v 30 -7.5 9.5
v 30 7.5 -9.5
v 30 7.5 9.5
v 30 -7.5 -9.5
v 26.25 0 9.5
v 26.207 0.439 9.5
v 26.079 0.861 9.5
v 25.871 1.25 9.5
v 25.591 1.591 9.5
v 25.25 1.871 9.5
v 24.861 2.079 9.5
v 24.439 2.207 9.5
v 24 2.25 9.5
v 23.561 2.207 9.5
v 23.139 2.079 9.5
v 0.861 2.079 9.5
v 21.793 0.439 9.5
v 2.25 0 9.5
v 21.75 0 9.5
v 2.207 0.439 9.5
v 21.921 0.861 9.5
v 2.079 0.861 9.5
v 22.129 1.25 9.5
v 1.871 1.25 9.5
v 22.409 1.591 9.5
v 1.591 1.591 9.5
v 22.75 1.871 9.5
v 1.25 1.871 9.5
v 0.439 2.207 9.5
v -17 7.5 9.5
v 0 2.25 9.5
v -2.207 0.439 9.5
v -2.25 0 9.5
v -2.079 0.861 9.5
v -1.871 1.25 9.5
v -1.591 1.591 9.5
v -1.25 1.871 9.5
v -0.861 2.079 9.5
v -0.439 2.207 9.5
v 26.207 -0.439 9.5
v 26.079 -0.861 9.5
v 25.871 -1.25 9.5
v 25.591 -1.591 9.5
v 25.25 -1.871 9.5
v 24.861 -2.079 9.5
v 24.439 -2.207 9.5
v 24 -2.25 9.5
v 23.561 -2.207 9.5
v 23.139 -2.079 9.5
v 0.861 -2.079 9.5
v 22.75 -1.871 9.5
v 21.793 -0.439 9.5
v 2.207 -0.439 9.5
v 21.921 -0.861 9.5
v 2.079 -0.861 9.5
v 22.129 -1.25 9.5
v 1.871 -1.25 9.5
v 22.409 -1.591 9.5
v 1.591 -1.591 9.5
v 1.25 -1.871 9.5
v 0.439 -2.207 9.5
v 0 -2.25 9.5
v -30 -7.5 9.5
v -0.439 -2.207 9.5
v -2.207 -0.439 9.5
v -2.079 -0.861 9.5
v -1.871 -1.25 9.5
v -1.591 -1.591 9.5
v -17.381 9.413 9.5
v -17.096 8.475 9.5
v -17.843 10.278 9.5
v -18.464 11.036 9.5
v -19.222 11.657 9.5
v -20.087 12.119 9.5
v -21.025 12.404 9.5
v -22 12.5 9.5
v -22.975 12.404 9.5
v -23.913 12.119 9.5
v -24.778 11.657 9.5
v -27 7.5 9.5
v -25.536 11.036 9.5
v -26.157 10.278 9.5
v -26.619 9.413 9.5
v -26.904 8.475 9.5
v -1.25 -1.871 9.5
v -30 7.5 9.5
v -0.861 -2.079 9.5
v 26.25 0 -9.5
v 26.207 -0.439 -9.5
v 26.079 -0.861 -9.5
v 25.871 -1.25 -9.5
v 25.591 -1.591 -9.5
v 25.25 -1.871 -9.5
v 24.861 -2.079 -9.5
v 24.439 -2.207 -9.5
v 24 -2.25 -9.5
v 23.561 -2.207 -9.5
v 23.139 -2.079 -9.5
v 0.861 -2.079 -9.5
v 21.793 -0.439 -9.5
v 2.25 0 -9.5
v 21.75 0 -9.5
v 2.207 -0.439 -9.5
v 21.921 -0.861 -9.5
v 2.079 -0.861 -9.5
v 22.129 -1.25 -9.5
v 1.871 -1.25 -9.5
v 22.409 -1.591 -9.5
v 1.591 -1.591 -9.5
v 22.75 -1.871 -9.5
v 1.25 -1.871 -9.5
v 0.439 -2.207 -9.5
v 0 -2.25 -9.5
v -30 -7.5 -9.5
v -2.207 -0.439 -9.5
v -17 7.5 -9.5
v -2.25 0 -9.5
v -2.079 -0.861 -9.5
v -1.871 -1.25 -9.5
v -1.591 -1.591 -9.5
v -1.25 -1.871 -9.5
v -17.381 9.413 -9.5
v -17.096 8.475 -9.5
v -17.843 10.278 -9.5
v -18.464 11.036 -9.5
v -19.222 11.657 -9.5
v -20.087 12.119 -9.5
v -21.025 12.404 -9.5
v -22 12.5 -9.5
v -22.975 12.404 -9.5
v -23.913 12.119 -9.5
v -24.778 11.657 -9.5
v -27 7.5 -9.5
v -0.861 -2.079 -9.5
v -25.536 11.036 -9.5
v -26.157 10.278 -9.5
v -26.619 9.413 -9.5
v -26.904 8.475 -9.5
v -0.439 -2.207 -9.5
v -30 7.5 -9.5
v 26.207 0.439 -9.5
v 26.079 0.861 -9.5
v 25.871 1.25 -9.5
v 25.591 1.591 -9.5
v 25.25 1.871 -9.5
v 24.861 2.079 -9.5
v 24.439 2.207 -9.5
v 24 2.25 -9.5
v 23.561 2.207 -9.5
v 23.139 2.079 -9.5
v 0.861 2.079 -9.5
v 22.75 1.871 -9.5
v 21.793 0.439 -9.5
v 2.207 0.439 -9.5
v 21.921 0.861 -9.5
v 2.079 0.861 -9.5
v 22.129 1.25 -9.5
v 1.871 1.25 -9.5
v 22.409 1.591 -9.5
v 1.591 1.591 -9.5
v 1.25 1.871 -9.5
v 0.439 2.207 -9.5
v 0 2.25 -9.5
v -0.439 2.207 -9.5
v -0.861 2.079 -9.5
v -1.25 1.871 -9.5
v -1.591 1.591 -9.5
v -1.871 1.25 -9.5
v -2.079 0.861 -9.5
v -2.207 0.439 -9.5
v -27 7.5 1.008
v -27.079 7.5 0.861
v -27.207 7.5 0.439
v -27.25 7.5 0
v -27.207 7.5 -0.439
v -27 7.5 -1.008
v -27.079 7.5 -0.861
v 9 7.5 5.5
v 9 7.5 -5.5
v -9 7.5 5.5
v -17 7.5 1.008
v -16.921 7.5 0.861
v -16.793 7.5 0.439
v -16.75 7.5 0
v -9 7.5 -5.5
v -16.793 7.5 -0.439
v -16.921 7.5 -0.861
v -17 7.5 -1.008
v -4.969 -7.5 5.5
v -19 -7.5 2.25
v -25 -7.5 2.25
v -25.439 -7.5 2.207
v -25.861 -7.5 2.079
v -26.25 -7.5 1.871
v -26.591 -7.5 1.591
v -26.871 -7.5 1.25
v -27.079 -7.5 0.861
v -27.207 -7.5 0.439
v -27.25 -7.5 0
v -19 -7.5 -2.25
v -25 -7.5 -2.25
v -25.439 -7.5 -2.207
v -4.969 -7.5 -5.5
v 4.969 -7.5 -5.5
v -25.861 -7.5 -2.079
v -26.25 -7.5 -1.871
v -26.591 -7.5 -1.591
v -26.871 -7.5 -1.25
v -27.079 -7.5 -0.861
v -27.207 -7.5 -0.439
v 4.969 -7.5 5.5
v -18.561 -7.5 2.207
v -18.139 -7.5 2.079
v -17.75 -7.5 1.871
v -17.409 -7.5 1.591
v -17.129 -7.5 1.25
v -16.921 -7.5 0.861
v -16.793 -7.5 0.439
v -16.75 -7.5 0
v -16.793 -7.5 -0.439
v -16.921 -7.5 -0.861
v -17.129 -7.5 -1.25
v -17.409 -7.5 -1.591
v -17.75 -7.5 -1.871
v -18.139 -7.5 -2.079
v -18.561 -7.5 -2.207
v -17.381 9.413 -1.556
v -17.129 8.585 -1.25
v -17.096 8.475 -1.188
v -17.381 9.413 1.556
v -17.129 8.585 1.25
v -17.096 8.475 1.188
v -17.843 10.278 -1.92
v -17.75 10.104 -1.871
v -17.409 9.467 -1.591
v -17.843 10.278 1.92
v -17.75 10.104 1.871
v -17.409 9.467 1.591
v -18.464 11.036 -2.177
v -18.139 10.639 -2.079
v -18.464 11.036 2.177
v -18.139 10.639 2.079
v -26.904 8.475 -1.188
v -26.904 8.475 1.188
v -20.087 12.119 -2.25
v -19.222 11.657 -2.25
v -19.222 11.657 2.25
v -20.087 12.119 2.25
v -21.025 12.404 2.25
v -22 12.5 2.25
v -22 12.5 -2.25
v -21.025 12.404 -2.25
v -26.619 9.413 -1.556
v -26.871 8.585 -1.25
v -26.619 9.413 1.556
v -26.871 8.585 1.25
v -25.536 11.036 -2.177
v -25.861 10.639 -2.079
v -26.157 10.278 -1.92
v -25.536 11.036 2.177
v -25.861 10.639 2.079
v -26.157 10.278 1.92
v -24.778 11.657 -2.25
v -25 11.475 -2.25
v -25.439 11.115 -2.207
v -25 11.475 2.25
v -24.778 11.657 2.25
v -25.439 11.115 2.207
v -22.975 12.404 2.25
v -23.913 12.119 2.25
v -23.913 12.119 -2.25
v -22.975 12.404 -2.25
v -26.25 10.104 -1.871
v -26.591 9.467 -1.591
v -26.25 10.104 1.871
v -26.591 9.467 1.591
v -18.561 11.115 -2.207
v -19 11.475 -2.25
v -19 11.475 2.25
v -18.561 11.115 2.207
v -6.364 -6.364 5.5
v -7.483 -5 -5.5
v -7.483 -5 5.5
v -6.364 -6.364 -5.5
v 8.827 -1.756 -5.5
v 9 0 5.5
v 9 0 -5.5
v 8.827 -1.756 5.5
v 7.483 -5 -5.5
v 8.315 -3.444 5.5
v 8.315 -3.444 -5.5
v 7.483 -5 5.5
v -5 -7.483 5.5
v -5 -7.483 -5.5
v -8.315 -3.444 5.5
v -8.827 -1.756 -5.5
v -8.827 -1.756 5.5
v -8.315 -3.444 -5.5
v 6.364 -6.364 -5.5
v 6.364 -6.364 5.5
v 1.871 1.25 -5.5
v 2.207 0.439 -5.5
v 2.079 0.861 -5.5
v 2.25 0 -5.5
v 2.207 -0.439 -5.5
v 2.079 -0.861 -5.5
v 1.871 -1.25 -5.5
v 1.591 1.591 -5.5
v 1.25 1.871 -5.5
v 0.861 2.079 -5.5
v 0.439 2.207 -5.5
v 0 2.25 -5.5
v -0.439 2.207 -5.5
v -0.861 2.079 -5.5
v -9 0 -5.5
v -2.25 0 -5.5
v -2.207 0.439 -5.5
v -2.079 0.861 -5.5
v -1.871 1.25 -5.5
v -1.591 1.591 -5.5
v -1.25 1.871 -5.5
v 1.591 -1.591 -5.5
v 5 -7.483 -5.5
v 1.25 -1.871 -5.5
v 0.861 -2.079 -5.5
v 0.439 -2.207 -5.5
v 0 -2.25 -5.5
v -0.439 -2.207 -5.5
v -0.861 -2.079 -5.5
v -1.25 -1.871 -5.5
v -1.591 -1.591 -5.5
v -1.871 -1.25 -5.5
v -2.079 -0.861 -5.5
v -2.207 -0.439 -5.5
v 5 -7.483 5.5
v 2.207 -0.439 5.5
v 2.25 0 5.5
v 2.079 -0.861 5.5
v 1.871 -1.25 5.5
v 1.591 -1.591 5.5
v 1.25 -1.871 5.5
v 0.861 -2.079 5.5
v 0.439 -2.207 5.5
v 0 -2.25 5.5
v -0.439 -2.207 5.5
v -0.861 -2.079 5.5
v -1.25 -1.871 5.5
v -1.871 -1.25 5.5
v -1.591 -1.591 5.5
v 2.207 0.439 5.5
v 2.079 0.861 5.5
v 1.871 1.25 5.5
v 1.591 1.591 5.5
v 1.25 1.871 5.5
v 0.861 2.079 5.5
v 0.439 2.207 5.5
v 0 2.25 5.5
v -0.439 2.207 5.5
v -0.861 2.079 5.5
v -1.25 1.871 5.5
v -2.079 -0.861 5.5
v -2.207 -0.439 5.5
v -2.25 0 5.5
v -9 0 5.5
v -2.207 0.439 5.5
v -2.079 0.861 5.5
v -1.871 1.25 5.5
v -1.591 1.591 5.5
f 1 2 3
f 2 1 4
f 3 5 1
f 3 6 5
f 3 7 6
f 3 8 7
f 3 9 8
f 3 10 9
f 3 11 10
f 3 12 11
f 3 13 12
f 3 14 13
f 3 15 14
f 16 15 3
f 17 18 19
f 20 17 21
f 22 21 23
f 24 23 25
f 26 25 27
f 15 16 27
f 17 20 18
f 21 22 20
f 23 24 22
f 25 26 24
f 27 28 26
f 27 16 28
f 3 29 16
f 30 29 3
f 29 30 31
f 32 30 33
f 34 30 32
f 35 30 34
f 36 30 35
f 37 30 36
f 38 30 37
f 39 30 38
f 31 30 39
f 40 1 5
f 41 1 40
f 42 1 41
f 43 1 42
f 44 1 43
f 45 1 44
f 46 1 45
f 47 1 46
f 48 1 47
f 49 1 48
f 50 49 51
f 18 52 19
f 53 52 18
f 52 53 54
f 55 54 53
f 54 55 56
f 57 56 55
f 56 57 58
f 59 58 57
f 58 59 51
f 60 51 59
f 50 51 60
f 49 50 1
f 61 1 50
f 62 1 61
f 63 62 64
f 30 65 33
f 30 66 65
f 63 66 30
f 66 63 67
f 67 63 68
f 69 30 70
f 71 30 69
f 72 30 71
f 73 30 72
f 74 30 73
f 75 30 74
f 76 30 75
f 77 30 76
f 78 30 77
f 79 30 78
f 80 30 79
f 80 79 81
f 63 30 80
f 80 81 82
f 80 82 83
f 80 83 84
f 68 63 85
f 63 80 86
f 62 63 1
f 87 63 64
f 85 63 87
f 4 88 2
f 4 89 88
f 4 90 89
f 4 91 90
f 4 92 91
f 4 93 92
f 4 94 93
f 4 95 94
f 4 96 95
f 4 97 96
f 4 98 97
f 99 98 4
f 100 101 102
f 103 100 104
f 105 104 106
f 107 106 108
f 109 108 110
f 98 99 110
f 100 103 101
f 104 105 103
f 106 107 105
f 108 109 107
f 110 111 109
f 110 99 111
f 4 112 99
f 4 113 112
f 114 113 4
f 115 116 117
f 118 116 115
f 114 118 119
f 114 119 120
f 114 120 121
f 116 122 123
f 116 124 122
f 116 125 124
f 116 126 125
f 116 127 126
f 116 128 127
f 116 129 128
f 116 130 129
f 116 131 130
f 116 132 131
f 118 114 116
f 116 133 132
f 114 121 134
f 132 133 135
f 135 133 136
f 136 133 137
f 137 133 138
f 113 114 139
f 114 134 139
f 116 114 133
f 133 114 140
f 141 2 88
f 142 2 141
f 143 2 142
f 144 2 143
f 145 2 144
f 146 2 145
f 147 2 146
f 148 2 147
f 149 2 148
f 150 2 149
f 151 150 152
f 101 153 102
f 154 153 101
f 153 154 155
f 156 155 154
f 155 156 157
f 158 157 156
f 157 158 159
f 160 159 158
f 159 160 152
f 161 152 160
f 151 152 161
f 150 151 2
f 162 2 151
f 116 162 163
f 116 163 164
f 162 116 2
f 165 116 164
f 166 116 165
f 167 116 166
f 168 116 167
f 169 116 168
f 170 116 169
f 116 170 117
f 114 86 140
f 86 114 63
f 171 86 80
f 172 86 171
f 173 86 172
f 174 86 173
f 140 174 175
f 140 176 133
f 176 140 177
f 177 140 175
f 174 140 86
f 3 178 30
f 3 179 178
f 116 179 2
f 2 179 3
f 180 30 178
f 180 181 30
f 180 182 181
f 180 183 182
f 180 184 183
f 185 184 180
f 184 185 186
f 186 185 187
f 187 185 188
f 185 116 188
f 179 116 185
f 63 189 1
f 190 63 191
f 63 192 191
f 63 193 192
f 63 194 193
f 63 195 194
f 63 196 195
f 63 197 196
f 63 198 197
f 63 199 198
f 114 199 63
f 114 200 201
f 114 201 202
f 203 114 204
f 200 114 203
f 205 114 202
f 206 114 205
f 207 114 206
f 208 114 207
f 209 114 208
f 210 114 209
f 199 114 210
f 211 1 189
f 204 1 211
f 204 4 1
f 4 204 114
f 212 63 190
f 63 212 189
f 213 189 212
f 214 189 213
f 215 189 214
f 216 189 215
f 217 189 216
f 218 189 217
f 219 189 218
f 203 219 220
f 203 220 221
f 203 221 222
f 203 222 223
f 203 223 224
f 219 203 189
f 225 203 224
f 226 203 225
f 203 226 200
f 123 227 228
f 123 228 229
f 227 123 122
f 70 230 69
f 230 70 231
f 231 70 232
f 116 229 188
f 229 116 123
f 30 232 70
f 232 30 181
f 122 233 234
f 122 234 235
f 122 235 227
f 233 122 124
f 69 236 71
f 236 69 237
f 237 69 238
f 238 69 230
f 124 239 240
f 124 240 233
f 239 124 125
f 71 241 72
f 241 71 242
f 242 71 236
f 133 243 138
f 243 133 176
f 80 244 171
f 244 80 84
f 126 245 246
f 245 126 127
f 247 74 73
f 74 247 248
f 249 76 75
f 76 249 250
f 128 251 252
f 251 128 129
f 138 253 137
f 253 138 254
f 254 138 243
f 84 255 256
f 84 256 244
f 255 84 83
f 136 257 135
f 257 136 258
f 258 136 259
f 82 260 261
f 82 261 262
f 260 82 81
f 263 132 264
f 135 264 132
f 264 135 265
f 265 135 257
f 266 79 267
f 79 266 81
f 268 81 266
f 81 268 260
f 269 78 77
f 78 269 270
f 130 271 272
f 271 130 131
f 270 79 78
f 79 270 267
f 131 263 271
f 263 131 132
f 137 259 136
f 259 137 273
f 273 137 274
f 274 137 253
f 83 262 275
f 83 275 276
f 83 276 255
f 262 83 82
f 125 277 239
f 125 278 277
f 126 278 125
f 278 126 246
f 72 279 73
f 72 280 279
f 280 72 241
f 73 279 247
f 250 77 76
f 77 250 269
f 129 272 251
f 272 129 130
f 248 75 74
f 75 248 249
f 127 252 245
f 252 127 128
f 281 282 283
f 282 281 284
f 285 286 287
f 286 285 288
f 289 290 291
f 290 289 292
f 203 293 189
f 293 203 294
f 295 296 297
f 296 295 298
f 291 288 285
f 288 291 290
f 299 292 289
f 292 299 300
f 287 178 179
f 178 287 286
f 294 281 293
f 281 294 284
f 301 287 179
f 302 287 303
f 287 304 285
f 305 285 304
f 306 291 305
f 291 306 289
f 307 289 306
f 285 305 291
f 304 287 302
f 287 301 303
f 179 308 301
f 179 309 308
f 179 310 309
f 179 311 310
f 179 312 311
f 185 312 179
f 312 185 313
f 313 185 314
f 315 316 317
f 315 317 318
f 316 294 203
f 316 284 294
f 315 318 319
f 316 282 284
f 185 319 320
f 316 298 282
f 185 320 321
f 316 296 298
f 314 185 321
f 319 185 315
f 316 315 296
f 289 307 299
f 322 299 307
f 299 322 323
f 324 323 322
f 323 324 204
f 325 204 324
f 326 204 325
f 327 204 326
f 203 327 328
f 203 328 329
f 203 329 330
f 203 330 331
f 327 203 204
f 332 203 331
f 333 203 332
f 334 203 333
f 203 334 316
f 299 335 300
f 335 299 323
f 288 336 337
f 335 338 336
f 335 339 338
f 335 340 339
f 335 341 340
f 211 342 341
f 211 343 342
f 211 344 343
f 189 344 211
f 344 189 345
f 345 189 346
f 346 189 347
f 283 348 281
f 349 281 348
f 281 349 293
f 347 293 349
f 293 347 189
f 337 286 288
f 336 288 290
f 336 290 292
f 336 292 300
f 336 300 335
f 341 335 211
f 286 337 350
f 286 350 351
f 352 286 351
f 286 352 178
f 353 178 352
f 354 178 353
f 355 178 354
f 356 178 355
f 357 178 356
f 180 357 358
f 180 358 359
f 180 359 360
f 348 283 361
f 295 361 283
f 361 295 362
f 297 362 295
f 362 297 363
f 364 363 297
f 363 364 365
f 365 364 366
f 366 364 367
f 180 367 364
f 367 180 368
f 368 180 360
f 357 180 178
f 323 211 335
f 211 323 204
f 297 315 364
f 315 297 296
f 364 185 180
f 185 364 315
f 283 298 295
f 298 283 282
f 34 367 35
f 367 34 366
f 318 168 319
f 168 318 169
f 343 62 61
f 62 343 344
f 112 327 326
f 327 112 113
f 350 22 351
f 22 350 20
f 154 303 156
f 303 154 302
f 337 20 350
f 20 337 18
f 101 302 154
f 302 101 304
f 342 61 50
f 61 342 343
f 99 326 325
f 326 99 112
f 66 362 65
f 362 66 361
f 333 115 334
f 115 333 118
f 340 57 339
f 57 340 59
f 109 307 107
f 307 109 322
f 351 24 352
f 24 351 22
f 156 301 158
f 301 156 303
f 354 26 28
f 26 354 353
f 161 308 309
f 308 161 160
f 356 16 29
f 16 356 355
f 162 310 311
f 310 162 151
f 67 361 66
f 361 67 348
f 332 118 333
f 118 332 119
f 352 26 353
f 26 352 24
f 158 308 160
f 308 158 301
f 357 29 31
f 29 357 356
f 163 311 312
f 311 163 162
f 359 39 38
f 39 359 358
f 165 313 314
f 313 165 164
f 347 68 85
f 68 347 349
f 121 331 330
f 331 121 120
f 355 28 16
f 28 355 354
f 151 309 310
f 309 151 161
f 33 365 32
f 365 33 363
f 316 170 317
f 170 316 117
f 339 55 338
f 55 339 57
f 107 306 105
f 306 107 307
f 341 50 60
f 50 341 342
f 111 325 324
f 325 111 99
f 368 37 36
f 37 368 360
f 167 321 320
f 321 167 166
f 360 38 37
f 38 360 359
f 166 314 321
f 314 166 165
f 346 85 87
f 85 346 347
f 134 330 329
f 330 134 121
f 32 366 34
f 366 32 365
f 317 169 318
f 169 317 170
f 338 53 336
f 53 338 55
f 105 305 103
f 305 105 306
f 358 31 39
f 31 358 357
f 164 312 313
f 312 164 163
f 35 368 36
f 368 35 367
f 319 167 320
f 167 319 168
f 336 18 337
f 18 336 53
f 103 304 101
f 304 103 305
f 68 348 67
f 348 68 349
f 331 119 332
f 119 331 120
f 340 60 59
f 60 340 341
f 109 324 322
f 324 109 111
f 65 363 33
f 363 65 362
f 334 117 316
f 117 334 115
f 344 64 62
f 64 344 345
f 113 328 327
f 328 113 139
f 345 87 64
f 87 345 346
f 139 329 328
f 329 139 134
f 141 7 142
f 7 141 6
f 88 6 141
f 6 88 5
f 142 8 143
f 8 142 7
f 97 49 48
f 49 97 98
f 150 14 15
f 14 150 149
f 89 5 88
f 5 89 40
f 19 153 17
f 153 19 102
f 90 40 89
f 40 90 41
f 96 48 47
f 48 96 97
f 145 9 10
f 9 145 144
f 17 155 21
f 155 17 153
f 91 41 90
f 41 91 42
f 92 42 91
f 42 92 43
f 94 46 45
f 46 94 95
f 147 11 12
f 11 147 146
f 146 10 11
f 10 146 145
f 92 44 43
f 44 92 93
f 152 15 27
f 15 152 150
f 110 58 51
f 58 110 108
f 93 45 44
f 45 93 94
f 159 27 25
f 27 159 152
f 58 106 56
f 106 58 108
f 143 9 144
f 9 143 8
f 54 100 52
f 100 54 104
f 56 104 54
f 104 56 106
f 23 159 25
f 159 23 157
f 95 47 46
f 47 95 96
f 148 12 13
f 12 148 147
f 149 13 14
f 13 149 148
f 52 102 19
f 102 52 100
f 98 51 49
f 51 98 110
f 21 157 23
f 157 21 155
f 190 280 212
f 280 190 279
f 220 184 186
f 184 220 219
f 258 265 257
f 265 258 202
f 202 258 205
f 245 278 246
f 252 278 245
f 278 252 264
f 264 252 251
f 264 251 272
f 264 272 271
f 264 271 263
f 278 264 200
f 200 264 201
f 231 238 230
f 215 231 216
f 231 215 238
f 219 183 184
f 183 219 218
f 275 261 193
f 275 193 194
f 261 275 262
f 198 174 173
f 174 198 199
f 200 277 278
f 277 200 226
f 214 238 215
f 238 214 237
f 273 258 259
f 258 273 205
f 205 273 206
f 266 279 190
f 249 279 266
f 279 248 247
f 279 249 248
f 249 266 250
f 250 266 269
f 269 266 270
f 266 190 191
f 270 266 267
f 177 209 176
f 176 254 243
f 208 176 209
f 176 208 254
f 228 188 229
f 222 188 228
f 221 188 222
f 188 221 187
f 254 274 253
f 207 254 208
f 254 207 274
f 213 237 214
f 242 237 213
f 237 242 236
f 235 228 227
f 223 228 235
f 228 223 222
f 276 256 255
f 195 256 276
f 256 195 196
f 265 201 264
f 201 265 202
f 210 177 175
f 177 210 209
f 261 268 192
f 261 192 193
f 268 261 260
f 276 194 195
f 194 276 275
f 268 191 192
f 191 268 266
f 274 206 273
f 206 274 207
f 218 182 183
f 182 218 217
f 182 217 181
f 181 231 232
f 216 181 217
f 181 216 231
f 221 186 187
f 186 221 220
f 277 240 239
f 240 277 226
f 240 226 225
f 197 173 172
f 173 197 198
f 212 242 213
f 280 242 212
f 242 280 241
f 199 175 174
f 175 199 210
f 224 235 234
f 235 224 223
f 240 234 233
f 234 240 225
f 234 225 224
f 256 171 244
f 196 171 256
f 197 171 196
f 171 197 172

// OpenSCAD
// file: modules.scad
// Fonctions personnalisées

//http://forum.openscad.org/Wish-mirror-copy-true-td10681.html
module copy_mirror(vec=[0,1,0])
{
    children();
    mirror(vec) children();
}

module ecrou(plat,h){
  cylinder(d=plat*2/sqrt(3), h=h, $fn=6);
}


module courroie(diam,longueur){
  color ("black")
  difference(){
    hull(){
      cylinder(d=diam+1, h=6, $fn=32);
      translate([longueur,0,0]) cylinder(d=diam+1, h=6, $fn=32);
    }
    translate([0,0,-1])
    hull(){
      cylinder(d=diam-1, h=8, $fn=32);
      translate([longueur,0,0]) cylinder(d=diam-1, h=8, $fn=32);
    }
  }
  
  
}
// file: config.scad
// Paramètres de la machine

decal=-30;            // décallage du chassis xz
hauteur=400;          // hauteur totale chassis
largeur=400;          // largeur totale chassis
longueur=470;         // longueur totale chassis
hauteur_base=90;      // hauteur de la base
entraxe_y=140;        // distance entre les tiges Ø8 axe Y
entraxe_x=45;         // distance entre les tiges Ø8 axe X

couleur=[1,0.6,0];



// Paramètre des pièces et jeux

// écart plateau/courroie
// y_belt_holder
belt_h=13;      // écart entre la courroie et le plateau

// écart plateau/tiges lisses
// y_lm8uu
decal_plateau=12; // Décallage en Y

// décallage des tiges lisses Y
// support_tige8_y
decal_tiges=5;

// décallage moteur Y
// y_motor
decal_motory_z=11;
decal_motory_y=25;

// Equerres de fixation position fermée
eq_ec=10;      // écart entre profilés

// Fixations axe Z
pos_z=26;      // position des axes par rapport au profilé (>= 21)
hauteur_z=20;  // hauteur des fixations
entraxe_z=17;  // distance entre les tiges Ø8 et M5
// est ce que la tige de 8 dépasse du profilé de 30?
// si oui, on décale les fixations
decalx=max(-42/2+entraxe_z+8/2+2, 0);

// Roulements linéaires
lbd = 15; // diamètre ext
lbh = 24; // hauteur

// x_carriage
he_x=23;  // entraxe hotend x
he_y=23;  // entraxe hotend y
sen_x=13; // entraxe capteur x
sen_y=23; // entraxe capteur y

// Plats écrous
ec3=5.7;
ec4=7.2;
ec5=8.2;
ec6=10.2;

// Jeu sur plats pour les écrous glissants
jec=0.2;

// hauteur écrous
ec3h=2.4;
ec4h=3.2;
ec5h=4.7;
ec6h=5.2;

// Vis
vis3=3.5;
vis4=4.5;
vis5=5.5;
vis6=6.5;

// nombre de dents des poulies
poulie=20;

// Pas des courroies
pas=2;

// diamètre des poulies
dpoulie=poulie*pas/3.1416;
// main file
// eLKa1
// y_belt_idler_2
// GNU GPL v3
// lkiefer <blog.lkiefer.org> and contributors
// http://www.reprap.org/wiki/ELKa
// https://github.com/kimented/elka1

include <config.scad>;
use <modules.scad>;

module y_belt_idler_2(){
  ep=4;
  hauteur=11; //14
  largeur=24; //20
  ecart=14;
  $fn=32;
  vis=vis4;
  ec=ec4;
  ech=ec4h;
  
  
  long=60;
  prof=15;
    
  color (couleur){
    //cylinder(d=largeur, h=ecart);
    //translate([])
    difference(){
      union(){
        cube([long,prof,hauteur+2*ep], center=true);
        translate([-long/2+8,prof/2,0]) cylinder(d=10, h=hauteur+2*ep, center=true);
      }
      // trou roulement
      hull(){
        cylinder(h=hauteur, d=18, center=true);
        translate([0,prof,0]) cylinder(h=hauteur, d=18, center=true);
      }
      cylinder(d=vis4, h=hauteur+2*ep+2, center=true);
      // axe
      translate([long/2-6,0,0]) cylinder(d=vis4, h=hauteur+2*ep+2, center=true);
      // serrage
      hull(){
        rotate([90,0,0]) translate([-long/2+5,0,0]) cylinder(d=vis4, h=prof+10+2, center=true);
        rotate([90,0,0]) translate([-long/2+11,0,0]) cylinder(d=vis4, h=prof+10+2, center=true);
      }
    }
    
  }
}

y_belt_idler_2();
